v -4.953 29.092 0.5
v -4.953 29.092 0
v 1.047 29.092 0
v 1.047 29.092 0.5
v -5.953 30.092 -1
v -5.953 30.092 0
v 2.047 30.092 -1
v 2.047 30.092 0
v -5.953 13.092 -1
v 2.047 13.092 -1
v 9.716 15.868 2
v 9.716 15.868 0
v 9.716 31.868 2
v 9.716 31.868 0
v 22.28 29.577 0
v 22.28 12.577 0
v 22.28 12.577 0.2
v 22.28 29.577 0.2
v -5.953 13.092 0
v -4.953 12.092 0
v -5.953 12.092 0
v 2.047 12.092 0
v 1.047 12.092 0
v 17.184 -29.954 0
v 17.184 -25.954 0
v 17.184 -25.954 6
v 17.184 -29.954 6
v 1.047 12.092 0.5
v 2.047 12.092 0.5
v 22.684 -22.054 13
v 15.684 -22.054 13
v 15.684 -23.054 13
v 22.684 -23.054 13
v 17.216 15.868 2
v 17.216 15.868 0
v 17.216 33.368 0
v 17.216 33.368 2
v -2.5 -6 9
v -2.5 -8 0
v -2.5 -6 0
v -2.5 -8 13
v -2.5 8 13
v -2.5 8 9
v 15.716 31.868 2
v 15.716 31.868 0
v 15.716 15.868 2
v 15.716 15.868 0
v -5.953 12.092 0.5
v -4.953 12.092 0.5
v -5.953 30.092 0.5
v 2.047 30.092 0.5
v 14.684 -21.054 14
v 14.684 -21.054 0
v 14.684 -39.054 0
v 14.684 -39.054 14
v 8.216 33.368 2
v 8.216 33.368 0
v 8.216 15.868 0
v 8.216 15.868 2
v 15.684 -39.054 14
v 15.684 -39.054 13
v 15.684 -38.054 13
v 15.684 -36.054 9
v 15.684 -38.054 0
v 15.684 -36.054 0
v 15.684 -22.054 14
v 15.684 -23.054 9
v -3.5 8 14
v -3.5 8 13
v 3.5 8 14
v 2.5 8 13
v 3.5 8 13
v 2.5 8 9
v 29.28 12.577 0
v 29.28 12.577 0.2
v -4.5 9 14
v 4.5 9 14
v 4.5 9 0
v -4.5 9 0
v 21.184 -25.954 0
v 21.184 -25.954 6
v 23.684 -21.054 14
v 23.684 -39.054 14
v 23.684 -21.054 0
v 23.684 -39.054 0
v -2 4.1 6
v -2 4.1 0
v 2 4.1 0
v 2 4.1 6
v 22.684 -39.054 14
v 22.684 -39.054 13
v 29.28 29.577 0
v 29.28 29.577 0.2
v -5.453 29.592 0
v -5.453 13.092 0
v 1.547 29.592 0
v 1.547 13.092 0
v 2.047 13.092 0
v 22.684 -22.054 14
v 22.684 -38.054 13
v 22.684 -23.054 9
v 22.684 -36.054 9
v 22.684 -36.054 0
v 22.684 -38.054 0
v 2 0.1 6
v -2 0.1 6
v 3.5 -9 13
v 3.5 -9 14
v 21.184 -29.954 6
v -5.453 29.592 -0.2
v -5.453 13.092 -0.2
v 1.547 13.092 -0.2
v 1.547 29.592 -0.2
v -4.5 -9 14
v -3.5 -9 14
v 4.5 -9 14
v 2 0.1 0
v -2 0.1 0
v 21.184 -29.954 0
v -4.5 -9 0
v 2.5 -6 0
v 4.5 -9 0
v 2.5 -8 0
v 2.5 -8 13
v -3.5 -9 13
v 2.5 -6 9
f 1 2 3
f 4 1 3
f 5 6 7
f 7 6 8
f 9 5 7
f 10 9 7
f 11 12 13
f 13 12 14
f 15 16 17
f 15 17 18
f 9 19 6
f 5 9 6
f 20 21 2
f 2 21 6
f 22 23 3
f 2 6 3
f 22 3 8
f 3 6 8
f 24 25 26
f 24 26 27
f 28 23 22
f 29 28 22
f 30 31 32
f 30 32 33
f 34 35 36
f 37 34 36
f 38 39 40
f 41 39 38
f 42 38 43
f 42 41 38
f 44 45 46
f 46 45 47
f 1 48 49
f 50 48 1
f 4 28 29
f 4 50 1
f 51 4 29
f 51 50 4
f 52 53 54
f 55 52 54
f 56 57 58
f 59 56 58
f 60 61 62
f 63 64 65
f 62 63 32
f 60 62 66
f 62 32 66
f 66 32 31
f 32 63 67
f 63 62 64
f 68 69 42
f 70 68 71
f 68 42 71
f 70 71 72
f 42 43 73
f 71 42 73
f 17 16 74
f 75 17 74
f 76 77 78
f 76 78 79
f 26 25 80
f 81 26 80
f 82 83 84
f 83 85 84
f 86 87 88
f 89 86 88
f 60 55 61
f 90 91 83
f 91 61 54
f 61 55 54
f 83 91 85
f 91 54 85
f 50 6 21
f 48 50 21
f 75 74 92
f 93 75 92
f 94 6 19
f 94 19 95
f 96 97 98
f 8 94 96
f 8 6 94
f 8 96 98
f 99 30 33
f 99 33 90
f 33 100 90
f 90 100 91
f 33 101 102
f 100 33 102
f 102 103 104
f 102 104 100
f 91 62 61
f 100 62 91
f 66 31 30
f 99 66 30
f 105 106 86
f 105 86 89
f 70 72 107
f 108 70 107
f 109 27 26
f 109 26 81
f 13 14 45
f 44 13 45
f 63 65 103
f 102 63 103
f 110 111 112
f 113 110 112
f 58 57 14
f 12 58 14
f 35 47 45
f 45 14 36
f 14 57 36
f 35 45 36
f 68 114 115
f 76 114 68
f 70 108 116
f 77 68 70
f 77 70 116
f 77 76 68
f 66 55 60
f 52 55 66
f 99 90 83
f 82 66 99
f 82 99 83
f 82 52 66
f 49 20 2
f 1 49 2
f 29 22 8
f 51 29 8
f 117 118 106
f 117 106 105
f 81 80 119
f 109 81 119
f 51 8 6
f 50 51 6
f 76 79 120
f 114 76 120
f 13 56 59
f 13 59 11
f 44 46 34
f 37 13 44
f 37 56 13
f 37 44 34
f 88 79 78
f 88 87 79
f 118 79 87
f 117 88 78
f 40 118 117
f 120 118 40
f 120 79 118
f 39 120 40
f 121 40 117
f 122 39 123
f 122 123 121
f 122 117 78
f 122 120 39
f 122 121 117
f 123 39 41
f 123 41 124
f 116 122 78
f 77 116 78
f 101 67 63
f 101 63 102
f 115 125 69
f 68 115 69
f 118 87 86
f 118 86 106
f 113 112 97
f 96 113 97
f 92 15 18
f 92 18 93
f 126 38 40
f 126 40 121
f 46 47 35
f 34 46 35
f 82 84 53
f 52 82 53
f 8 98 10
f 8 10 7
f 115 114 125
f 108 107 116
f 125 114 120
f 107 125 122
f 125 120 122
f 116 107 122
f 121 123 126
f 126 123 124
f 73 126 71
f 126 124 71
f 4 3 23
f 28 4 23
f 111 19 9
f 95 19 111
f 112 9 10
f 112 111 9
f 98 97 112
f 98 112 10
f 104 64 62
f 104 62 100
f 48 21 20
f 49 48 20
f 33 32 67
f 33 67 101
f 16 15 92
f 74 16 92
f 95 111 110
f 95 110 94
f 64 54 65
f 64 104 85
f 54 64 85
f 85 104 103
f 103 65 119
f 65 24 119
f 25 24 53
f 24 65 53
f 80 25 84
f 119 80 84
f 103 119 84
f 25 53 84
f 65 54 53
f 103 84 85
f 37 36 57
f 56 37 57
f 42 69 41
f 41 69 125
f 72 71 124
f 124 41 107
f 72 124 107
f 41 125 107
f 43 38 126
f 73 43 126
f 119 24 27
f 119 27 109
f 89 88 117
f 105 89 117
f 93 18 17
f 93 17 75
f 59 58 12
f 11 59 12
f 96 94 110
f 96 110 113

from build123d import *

# Parameters (mm, degrees)
F0_W      = 9
F0_H      = 18
F1_DEPTH  = 13
F2_W      = 4
F2_H      = 4
F3_DEPTH  = 6
F4_W      = 5
F4_H      = 4
F5_DEPTH  = 17
F7_DEPTH  = 0.5
F8_W      = 8
F8_H      = 17
F9_DEPTH  = 1
F10_W     = 7
F10_H     = 0.2
F11_DEPTH = 16.5
F13_DEPTH = 2
F14_W     = 7
F14_H     = 17
F15_DEPTH = 0.2
F16_W     = 5
F16_H     = 3
F17_DEPTH = 25
F19_DEPTH = 1
F20_W     = 5
F20_H     = 1
F21_DEPTH = 13
F22_W     = 9
F22_H     = 18
F23_DEPTH = 13
F24_W     = 7
F24_H     = 15
F25_DEPTH = 4
F26_W     = 4
F26_H     = 4
F27_DEPTH = 6
F26_W_2   = 7
F26_H_2   = 2
F28_DEPTH = 9
F30_DEPTH = 1


with BuildPart() as f1:
    # F0 (on Top) → F1 (new body)
    with BuildSketch(Plane.XY):
        Rectangle(F0_W, F0_H)
    extrude(amount=F1_DEPTH)

    # F2 (on face) → F3 (cut)
    with BuildSketch(Plane(origin=(0, 0, 0), x_dir=(1, 0, 0), z_dir=(0, 0, -1))):
        with Locations((0, -2.1)):
            Rectangle(F2_W, F2_H)
    extrude(amount=-F3_DEPTH, mode=Mode.SUBTRACT)

    # F4 (on face) → F5 (cut)
    with BuildSketch(Plane.XZ.offset(9)):
        with Locations((0, 11)):
            Rectangle(F4_W, F4_H)
    extrude(amount=-F5_DEPTH, mode=Mode.SUBTRACT)

    # F16 (on face) → F17 (cut)
    with BuildSketch(Plane.XY.offset(9)):
        with Locations((0, -7.5)):
            Rectangle(F16_W, F16_H)
    extrude(amount=-F17_DEPTH, mode=Mode.SUBTRACT)

    # F18 (on face) → F19 (join)
    with BuildSketch(Plane.XY.offset(13)):
        Polygon((-4.5, 9), (-4.5, -9), (-3.5, -9), (-3.5, 8), (3.5, 8), (3.5, -9), (4.5, -9), (4.5, 9), align=None)
    extrude(amount=F19_DEPTH)

    # F20 (on face) → F21 (join)
    with BuildSketch(Plane(origin=(0, 0, 0), x_dir=(1, 0, 0), z_dir=(0, 0, -1))):
        with Locations((0, 8.5)):
            Rectangle(F20_W, F20_H)
    extrude(amount=-F21_DEPTH)


with BuildPart() as f7:
    # F6 (on Top) → F7 (new body)
    with BuildSketch(Plane.XY):
        Polygon((-5.952834, 30.092424), (-5.952834, 12.092424), (-4.952834, 12.092424), (-4.952834, 29.092424), (1.047166, 29.092424), (1.047166, 12.092424), (2.047166, 12.092424), (2.047166, 30.092424), align=None)
    extrude(amount=F7_DEPTH)


with BuildPart() as f9:
    # F8 (on Top) → F9 (new body)
    with BuildSketch(Plane.XY):
        with Locations((-1.952834, 21.592424)):
            Rectangle(F8_W, F8_H)
    extrude(amount=-F9_DEPTH)

    # F10 (on face) → F11 (cut)
    with BuildSketch(Plane.XZ.offset(-13.092424)):
        with Locations((-1.952834, -0.1)):
            Rectangle(F10_W, F10_H)
    extrude(amount=-F11_DEPTH, mode=Mode.SUBTRACT)


with BuildPart() as f13:
    # F12 (on Top) → F13 (new body)
    with BuildSketch(Plane.XY):
        Polygon((8.215718, 33.367791), (8.215718, 15.867791), (9.715718, 15.867791), (9.715718, 31.867791), (15.715718, 31.867791), (15.715718, 15.867791), (17.215718, 15.867791), (17.215718, 33.367791), align=None)
    extrude(amount=F13_DEPTH)


with BuildPart() as f15:
    # F14 (on Top) → F15 (new body)
    with BuildSketch(Plane.XY):
        with Locations((25.7798, 21.077234)):
            Rectangle(F14_W, F14_H)
    extrude(amount=F15_DEPTH)


with BuildPart() as f23:
    # F22 (on Top) → F23 (new body)
    with BuildSketch(Plane.XY):
        with Locations((19.184066, -30.054056)):
            Rectangle(F22_W, F22_H)
    extrude(amount=F23_DEPTH)

    # F24 (on face) → F25 (cut)
    with BuildSketch(Plane.XY.offset(13)):
        with Locations((19.184066, -30.554056)):
            Rectangle(F24_W, F24_H)
    extrude(amount=-F25_DEPTH, mode=Mode.SUBTRACT)

    # F26 (on face) → F27 (cut)
    with BuildSketch(Plane(origin=(0, 0, 0), x_dir=(1, 0, 0), z_dir=(0, 0, -1))):
        with Locations((19.184066, 27.954056)):
            Rectangle(F26_W, F26_H)
    extrude(amount=-F27_DEPTH, mode=Mode.SUBTRACT)

    # F26 (on face) → F28 (cut)
    with BuildSketch(Plane(origin=(0, 0, 0), x_dir=(1, 0, 0), z_dir=(0, 0, -1))):
        with Locations((19.184066, 37.054056)):
            Rectangle(F26_W_2, F26_H_2)
    extrude(amount=-F28_DEPTH, mode=Mode.SUBTRACT)

    # F29 (on face) → F30 (join)
    with BuildSketch(Plane.XY.offset(13)):
        Polygon((14.684066, -21.054056), (14.684066, -39.054056), (15.684066, -39.054056), (15.684066, -22.054056), (22.684066, -22.054056), (22.684066, -39.054056), (23.684066, -39.054056), (23.684066, -21.054056), align=None)
    extrude(amount=F30_DEPTH)


solid = Compound([f1.part, f7.part, f9.part, f13.part, f15.part, f23.part])
